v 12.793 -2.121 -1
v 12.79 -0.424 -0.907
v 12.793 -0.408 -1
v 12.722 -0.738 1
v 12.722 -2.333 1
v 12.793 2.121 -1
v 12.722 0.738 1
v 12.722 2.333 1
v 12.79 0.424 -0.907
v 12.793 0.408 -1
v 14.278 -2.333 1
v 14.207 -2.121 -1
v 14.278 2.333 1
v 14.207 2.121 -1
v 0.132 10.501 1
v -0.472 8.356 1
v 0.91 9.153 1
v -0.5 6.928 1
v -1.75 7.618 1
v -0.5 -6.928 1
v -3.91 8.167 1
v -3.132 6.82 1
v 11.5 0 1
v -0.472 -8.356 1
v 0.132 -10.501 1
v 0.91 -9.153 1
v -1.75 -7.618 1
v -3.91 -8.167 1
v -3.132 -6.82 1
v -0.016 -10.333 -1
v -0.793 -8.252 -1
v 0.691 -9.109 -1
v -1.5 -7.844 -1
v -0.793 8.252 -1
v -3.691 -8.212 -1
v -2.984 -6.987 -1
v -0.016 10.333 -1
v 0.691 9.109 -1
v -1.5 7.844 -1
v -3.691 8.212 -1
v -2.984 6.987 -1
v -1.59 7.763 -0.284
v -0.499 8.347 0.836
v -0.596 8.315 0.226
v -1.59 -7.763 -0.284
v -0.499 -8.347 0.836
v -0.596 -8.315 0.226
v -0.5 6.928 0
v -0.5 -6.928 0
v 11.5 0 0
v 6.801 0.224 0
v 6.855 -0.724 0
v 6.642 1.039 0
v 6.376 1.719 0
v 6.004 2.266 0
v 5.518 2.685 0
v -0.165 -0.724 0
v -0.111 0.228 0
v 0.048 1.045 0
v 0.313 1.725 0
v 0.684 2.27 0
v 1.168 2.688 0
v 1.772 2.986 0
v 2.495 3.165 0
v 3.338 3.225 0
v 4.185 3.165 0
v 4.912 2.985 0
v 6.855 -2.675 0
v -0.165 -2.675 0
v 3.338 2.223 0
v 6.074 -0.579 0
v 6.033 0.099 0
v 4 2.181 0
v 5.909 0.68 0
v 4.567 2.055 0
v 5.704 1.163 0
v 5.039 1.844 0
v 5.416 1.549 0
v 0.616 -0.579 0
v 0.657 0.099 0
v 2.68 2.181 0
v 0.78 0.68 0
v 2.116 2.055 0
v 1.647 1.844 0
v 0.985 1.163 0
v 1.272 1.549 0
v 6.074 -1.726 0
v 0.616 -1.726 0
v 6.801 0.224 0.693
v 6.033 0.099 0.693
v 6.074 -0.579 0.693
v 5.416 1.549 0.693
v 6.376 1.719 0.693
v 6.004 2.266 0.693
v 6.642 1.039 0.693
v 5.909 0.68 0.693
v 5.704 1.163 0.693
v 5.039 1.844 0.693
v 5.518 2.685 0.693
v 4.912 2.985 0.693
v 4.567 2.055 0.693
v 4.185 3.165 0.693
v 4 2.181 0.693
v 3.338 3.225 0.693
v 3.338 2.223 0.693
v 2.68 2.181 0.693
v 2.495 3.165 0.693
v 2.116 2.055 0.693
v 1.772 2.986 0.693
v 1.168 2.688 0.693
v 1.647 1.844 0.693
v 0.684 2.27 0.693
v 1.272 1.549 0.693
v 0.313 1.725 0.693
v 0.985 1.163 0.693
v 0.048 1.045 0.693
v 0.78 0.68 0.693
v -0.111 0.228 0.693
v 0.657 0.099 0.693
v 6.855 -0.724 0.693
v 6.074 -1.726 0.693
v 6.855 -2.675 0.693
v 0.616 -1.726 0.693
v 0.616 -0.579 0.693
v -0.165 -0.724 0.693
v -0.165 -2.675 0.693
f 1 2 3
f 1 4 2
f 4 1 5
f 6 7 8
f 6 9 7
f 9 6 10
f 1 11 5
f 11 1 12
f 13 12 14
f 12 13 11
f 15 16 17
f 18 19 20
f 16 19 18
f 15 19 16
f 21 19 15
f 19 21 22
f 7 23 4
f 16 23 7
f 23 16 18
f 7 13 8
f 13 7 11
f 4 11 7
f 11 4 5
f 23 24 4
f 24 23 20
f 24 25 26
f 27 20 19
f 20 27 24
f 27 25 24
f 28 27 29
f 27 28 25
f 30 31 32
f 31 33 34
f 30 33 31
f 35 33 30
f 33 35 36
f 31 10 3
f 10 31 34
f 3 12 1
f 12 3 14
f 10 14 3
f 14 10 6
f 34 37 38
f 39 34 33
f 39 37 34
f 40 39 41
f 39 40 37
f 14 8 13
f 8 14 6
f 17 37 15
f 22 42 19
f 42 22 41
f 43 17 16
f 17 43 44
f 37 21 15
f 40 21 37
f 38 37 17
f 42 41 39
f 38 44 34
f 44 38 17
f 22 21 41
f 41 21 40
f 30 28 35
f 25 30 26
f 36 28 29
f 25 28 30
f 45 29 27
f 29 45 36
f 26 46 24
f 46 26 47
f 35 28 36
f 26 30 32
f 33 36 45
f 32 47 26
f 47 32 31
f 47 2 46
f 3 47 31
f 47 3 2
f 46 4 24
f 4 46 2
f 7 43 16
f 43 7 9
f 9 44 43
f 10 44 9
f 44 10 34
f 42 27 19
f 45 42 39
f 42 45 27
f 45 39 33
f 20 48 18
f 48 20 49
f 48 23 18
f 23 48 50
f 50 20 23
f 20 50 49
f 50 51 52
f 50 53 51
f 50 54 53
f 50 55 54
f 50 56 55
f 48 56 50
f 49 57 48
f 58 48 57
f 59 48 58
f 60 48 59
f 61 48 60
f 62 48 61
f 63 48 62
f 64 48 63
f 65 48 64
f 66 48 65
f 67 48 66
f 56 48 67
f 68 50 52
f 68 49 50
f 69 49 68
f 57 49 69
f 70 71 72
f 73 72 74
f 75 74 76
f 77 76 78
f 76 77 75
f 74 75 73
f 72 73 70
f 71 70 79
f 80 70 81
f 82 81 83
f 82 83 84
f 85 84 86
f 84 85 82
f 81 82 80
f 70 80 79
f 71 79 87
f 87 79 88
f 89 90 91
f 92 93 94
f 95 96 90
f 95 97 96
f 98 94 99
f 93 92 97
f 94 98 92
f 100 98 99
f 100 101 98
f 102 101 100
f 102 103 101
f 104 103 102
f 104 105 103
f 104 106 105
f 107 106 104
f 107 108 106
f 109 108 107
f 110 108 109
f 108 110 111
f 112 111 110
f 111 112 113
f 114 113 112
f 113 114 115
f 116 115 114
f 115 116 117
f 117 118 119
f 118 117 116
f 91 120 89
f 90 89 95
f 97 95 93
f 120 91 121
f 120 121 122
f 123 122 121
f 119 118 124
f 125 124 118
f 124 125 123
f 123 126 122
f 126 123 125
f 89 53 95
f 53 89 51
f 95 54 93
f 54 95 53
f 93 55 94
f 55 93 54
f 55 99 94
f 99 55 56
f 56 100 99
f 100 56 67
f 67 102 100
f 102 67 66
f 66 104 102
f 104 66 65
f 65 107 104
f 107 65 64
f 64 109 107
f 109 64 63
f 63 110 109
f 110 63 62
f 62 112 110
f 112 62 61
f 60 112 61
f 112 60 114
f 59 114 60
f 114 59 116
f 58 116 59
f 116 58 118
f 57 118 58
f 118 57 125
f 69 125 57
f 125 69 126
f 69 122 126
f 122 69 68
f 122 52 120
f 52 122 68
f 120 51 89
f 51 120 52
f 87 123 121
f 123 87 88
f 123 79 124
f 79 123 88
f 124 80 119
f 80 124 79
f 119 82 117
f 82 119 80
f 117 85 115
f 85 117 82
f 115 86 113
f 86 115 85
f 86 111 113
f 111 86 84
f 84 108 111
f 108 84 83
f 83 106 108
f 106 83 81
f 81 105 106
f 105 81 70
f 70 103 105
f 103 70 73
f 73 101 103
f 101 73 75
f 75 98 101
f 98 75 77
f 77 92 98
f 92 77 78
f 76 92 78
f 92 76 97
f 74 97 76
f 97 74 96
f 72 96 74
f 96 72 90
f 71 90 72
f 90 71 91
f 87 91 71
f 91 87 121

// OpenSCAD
// preview[view:east, tilt:top]

/* [Token Text] */
token_letters = "D"; // [D, AC, PM, VA, RA] 

//Only use this if you are not using the preset values above.
other = ""; // Other - Use this if you need a different set of letters

/* [Hidden] */
extra = .02;
twidth = 20;
bthickness = 6;
tthickness=2;
theight = 2;
is_other = 0;

letters = len(other)==0 ? token_letters : other;
is_other = len(other)==0 ? 0 : 1;

letterWidth = 5.3;

letterWidth = len(letters)==1 ? 5.9 : (len(letters)==2 ? 7.5 : 8.5);

module triangle(width, thickness, height){
  $fn=3;
    difference(){
    cylinder(d1=width, d2=width+1, h=height, center=true);
    cylinder(d=width-(thickness*2), height+extra);
    }
}
module bar(){
  translate([(twidth/2),0,0]){
    cube([tthickness/2,bthickness,theight],center=true);
  }
}

module cyl_cube(x_val,y_val,hei){
    
  $fn=4;
  translate([(twidth/2),0,0]){ 
    scale([x_val,y_val,hei]){
      rotate([0,0,-45]){
        cylinder(d1=1, d2=1.1, h=1, center=true);
      }
    }
  }
}

module anvil(){
for (i = [0:1:2]) {
  rotate([0,0,i*(360/3)]){
    //bar();
    cyl_cube(tthickness,bthickness,theight);
  }

}

triangle(twidth,tthickness, theight);
}

translate([3.5,0,0]){
  anvil();
}

translate([0,0,0]){    
  rotate([0,0,90]){
    resize([letterWidth,0,0], auto=true){//x=5.3 or y=6.7
      linear_extrude(height=1){
        text(letters, valign = "top", halign = "center", font = "PT Serif");
      }
    }
  }
}
